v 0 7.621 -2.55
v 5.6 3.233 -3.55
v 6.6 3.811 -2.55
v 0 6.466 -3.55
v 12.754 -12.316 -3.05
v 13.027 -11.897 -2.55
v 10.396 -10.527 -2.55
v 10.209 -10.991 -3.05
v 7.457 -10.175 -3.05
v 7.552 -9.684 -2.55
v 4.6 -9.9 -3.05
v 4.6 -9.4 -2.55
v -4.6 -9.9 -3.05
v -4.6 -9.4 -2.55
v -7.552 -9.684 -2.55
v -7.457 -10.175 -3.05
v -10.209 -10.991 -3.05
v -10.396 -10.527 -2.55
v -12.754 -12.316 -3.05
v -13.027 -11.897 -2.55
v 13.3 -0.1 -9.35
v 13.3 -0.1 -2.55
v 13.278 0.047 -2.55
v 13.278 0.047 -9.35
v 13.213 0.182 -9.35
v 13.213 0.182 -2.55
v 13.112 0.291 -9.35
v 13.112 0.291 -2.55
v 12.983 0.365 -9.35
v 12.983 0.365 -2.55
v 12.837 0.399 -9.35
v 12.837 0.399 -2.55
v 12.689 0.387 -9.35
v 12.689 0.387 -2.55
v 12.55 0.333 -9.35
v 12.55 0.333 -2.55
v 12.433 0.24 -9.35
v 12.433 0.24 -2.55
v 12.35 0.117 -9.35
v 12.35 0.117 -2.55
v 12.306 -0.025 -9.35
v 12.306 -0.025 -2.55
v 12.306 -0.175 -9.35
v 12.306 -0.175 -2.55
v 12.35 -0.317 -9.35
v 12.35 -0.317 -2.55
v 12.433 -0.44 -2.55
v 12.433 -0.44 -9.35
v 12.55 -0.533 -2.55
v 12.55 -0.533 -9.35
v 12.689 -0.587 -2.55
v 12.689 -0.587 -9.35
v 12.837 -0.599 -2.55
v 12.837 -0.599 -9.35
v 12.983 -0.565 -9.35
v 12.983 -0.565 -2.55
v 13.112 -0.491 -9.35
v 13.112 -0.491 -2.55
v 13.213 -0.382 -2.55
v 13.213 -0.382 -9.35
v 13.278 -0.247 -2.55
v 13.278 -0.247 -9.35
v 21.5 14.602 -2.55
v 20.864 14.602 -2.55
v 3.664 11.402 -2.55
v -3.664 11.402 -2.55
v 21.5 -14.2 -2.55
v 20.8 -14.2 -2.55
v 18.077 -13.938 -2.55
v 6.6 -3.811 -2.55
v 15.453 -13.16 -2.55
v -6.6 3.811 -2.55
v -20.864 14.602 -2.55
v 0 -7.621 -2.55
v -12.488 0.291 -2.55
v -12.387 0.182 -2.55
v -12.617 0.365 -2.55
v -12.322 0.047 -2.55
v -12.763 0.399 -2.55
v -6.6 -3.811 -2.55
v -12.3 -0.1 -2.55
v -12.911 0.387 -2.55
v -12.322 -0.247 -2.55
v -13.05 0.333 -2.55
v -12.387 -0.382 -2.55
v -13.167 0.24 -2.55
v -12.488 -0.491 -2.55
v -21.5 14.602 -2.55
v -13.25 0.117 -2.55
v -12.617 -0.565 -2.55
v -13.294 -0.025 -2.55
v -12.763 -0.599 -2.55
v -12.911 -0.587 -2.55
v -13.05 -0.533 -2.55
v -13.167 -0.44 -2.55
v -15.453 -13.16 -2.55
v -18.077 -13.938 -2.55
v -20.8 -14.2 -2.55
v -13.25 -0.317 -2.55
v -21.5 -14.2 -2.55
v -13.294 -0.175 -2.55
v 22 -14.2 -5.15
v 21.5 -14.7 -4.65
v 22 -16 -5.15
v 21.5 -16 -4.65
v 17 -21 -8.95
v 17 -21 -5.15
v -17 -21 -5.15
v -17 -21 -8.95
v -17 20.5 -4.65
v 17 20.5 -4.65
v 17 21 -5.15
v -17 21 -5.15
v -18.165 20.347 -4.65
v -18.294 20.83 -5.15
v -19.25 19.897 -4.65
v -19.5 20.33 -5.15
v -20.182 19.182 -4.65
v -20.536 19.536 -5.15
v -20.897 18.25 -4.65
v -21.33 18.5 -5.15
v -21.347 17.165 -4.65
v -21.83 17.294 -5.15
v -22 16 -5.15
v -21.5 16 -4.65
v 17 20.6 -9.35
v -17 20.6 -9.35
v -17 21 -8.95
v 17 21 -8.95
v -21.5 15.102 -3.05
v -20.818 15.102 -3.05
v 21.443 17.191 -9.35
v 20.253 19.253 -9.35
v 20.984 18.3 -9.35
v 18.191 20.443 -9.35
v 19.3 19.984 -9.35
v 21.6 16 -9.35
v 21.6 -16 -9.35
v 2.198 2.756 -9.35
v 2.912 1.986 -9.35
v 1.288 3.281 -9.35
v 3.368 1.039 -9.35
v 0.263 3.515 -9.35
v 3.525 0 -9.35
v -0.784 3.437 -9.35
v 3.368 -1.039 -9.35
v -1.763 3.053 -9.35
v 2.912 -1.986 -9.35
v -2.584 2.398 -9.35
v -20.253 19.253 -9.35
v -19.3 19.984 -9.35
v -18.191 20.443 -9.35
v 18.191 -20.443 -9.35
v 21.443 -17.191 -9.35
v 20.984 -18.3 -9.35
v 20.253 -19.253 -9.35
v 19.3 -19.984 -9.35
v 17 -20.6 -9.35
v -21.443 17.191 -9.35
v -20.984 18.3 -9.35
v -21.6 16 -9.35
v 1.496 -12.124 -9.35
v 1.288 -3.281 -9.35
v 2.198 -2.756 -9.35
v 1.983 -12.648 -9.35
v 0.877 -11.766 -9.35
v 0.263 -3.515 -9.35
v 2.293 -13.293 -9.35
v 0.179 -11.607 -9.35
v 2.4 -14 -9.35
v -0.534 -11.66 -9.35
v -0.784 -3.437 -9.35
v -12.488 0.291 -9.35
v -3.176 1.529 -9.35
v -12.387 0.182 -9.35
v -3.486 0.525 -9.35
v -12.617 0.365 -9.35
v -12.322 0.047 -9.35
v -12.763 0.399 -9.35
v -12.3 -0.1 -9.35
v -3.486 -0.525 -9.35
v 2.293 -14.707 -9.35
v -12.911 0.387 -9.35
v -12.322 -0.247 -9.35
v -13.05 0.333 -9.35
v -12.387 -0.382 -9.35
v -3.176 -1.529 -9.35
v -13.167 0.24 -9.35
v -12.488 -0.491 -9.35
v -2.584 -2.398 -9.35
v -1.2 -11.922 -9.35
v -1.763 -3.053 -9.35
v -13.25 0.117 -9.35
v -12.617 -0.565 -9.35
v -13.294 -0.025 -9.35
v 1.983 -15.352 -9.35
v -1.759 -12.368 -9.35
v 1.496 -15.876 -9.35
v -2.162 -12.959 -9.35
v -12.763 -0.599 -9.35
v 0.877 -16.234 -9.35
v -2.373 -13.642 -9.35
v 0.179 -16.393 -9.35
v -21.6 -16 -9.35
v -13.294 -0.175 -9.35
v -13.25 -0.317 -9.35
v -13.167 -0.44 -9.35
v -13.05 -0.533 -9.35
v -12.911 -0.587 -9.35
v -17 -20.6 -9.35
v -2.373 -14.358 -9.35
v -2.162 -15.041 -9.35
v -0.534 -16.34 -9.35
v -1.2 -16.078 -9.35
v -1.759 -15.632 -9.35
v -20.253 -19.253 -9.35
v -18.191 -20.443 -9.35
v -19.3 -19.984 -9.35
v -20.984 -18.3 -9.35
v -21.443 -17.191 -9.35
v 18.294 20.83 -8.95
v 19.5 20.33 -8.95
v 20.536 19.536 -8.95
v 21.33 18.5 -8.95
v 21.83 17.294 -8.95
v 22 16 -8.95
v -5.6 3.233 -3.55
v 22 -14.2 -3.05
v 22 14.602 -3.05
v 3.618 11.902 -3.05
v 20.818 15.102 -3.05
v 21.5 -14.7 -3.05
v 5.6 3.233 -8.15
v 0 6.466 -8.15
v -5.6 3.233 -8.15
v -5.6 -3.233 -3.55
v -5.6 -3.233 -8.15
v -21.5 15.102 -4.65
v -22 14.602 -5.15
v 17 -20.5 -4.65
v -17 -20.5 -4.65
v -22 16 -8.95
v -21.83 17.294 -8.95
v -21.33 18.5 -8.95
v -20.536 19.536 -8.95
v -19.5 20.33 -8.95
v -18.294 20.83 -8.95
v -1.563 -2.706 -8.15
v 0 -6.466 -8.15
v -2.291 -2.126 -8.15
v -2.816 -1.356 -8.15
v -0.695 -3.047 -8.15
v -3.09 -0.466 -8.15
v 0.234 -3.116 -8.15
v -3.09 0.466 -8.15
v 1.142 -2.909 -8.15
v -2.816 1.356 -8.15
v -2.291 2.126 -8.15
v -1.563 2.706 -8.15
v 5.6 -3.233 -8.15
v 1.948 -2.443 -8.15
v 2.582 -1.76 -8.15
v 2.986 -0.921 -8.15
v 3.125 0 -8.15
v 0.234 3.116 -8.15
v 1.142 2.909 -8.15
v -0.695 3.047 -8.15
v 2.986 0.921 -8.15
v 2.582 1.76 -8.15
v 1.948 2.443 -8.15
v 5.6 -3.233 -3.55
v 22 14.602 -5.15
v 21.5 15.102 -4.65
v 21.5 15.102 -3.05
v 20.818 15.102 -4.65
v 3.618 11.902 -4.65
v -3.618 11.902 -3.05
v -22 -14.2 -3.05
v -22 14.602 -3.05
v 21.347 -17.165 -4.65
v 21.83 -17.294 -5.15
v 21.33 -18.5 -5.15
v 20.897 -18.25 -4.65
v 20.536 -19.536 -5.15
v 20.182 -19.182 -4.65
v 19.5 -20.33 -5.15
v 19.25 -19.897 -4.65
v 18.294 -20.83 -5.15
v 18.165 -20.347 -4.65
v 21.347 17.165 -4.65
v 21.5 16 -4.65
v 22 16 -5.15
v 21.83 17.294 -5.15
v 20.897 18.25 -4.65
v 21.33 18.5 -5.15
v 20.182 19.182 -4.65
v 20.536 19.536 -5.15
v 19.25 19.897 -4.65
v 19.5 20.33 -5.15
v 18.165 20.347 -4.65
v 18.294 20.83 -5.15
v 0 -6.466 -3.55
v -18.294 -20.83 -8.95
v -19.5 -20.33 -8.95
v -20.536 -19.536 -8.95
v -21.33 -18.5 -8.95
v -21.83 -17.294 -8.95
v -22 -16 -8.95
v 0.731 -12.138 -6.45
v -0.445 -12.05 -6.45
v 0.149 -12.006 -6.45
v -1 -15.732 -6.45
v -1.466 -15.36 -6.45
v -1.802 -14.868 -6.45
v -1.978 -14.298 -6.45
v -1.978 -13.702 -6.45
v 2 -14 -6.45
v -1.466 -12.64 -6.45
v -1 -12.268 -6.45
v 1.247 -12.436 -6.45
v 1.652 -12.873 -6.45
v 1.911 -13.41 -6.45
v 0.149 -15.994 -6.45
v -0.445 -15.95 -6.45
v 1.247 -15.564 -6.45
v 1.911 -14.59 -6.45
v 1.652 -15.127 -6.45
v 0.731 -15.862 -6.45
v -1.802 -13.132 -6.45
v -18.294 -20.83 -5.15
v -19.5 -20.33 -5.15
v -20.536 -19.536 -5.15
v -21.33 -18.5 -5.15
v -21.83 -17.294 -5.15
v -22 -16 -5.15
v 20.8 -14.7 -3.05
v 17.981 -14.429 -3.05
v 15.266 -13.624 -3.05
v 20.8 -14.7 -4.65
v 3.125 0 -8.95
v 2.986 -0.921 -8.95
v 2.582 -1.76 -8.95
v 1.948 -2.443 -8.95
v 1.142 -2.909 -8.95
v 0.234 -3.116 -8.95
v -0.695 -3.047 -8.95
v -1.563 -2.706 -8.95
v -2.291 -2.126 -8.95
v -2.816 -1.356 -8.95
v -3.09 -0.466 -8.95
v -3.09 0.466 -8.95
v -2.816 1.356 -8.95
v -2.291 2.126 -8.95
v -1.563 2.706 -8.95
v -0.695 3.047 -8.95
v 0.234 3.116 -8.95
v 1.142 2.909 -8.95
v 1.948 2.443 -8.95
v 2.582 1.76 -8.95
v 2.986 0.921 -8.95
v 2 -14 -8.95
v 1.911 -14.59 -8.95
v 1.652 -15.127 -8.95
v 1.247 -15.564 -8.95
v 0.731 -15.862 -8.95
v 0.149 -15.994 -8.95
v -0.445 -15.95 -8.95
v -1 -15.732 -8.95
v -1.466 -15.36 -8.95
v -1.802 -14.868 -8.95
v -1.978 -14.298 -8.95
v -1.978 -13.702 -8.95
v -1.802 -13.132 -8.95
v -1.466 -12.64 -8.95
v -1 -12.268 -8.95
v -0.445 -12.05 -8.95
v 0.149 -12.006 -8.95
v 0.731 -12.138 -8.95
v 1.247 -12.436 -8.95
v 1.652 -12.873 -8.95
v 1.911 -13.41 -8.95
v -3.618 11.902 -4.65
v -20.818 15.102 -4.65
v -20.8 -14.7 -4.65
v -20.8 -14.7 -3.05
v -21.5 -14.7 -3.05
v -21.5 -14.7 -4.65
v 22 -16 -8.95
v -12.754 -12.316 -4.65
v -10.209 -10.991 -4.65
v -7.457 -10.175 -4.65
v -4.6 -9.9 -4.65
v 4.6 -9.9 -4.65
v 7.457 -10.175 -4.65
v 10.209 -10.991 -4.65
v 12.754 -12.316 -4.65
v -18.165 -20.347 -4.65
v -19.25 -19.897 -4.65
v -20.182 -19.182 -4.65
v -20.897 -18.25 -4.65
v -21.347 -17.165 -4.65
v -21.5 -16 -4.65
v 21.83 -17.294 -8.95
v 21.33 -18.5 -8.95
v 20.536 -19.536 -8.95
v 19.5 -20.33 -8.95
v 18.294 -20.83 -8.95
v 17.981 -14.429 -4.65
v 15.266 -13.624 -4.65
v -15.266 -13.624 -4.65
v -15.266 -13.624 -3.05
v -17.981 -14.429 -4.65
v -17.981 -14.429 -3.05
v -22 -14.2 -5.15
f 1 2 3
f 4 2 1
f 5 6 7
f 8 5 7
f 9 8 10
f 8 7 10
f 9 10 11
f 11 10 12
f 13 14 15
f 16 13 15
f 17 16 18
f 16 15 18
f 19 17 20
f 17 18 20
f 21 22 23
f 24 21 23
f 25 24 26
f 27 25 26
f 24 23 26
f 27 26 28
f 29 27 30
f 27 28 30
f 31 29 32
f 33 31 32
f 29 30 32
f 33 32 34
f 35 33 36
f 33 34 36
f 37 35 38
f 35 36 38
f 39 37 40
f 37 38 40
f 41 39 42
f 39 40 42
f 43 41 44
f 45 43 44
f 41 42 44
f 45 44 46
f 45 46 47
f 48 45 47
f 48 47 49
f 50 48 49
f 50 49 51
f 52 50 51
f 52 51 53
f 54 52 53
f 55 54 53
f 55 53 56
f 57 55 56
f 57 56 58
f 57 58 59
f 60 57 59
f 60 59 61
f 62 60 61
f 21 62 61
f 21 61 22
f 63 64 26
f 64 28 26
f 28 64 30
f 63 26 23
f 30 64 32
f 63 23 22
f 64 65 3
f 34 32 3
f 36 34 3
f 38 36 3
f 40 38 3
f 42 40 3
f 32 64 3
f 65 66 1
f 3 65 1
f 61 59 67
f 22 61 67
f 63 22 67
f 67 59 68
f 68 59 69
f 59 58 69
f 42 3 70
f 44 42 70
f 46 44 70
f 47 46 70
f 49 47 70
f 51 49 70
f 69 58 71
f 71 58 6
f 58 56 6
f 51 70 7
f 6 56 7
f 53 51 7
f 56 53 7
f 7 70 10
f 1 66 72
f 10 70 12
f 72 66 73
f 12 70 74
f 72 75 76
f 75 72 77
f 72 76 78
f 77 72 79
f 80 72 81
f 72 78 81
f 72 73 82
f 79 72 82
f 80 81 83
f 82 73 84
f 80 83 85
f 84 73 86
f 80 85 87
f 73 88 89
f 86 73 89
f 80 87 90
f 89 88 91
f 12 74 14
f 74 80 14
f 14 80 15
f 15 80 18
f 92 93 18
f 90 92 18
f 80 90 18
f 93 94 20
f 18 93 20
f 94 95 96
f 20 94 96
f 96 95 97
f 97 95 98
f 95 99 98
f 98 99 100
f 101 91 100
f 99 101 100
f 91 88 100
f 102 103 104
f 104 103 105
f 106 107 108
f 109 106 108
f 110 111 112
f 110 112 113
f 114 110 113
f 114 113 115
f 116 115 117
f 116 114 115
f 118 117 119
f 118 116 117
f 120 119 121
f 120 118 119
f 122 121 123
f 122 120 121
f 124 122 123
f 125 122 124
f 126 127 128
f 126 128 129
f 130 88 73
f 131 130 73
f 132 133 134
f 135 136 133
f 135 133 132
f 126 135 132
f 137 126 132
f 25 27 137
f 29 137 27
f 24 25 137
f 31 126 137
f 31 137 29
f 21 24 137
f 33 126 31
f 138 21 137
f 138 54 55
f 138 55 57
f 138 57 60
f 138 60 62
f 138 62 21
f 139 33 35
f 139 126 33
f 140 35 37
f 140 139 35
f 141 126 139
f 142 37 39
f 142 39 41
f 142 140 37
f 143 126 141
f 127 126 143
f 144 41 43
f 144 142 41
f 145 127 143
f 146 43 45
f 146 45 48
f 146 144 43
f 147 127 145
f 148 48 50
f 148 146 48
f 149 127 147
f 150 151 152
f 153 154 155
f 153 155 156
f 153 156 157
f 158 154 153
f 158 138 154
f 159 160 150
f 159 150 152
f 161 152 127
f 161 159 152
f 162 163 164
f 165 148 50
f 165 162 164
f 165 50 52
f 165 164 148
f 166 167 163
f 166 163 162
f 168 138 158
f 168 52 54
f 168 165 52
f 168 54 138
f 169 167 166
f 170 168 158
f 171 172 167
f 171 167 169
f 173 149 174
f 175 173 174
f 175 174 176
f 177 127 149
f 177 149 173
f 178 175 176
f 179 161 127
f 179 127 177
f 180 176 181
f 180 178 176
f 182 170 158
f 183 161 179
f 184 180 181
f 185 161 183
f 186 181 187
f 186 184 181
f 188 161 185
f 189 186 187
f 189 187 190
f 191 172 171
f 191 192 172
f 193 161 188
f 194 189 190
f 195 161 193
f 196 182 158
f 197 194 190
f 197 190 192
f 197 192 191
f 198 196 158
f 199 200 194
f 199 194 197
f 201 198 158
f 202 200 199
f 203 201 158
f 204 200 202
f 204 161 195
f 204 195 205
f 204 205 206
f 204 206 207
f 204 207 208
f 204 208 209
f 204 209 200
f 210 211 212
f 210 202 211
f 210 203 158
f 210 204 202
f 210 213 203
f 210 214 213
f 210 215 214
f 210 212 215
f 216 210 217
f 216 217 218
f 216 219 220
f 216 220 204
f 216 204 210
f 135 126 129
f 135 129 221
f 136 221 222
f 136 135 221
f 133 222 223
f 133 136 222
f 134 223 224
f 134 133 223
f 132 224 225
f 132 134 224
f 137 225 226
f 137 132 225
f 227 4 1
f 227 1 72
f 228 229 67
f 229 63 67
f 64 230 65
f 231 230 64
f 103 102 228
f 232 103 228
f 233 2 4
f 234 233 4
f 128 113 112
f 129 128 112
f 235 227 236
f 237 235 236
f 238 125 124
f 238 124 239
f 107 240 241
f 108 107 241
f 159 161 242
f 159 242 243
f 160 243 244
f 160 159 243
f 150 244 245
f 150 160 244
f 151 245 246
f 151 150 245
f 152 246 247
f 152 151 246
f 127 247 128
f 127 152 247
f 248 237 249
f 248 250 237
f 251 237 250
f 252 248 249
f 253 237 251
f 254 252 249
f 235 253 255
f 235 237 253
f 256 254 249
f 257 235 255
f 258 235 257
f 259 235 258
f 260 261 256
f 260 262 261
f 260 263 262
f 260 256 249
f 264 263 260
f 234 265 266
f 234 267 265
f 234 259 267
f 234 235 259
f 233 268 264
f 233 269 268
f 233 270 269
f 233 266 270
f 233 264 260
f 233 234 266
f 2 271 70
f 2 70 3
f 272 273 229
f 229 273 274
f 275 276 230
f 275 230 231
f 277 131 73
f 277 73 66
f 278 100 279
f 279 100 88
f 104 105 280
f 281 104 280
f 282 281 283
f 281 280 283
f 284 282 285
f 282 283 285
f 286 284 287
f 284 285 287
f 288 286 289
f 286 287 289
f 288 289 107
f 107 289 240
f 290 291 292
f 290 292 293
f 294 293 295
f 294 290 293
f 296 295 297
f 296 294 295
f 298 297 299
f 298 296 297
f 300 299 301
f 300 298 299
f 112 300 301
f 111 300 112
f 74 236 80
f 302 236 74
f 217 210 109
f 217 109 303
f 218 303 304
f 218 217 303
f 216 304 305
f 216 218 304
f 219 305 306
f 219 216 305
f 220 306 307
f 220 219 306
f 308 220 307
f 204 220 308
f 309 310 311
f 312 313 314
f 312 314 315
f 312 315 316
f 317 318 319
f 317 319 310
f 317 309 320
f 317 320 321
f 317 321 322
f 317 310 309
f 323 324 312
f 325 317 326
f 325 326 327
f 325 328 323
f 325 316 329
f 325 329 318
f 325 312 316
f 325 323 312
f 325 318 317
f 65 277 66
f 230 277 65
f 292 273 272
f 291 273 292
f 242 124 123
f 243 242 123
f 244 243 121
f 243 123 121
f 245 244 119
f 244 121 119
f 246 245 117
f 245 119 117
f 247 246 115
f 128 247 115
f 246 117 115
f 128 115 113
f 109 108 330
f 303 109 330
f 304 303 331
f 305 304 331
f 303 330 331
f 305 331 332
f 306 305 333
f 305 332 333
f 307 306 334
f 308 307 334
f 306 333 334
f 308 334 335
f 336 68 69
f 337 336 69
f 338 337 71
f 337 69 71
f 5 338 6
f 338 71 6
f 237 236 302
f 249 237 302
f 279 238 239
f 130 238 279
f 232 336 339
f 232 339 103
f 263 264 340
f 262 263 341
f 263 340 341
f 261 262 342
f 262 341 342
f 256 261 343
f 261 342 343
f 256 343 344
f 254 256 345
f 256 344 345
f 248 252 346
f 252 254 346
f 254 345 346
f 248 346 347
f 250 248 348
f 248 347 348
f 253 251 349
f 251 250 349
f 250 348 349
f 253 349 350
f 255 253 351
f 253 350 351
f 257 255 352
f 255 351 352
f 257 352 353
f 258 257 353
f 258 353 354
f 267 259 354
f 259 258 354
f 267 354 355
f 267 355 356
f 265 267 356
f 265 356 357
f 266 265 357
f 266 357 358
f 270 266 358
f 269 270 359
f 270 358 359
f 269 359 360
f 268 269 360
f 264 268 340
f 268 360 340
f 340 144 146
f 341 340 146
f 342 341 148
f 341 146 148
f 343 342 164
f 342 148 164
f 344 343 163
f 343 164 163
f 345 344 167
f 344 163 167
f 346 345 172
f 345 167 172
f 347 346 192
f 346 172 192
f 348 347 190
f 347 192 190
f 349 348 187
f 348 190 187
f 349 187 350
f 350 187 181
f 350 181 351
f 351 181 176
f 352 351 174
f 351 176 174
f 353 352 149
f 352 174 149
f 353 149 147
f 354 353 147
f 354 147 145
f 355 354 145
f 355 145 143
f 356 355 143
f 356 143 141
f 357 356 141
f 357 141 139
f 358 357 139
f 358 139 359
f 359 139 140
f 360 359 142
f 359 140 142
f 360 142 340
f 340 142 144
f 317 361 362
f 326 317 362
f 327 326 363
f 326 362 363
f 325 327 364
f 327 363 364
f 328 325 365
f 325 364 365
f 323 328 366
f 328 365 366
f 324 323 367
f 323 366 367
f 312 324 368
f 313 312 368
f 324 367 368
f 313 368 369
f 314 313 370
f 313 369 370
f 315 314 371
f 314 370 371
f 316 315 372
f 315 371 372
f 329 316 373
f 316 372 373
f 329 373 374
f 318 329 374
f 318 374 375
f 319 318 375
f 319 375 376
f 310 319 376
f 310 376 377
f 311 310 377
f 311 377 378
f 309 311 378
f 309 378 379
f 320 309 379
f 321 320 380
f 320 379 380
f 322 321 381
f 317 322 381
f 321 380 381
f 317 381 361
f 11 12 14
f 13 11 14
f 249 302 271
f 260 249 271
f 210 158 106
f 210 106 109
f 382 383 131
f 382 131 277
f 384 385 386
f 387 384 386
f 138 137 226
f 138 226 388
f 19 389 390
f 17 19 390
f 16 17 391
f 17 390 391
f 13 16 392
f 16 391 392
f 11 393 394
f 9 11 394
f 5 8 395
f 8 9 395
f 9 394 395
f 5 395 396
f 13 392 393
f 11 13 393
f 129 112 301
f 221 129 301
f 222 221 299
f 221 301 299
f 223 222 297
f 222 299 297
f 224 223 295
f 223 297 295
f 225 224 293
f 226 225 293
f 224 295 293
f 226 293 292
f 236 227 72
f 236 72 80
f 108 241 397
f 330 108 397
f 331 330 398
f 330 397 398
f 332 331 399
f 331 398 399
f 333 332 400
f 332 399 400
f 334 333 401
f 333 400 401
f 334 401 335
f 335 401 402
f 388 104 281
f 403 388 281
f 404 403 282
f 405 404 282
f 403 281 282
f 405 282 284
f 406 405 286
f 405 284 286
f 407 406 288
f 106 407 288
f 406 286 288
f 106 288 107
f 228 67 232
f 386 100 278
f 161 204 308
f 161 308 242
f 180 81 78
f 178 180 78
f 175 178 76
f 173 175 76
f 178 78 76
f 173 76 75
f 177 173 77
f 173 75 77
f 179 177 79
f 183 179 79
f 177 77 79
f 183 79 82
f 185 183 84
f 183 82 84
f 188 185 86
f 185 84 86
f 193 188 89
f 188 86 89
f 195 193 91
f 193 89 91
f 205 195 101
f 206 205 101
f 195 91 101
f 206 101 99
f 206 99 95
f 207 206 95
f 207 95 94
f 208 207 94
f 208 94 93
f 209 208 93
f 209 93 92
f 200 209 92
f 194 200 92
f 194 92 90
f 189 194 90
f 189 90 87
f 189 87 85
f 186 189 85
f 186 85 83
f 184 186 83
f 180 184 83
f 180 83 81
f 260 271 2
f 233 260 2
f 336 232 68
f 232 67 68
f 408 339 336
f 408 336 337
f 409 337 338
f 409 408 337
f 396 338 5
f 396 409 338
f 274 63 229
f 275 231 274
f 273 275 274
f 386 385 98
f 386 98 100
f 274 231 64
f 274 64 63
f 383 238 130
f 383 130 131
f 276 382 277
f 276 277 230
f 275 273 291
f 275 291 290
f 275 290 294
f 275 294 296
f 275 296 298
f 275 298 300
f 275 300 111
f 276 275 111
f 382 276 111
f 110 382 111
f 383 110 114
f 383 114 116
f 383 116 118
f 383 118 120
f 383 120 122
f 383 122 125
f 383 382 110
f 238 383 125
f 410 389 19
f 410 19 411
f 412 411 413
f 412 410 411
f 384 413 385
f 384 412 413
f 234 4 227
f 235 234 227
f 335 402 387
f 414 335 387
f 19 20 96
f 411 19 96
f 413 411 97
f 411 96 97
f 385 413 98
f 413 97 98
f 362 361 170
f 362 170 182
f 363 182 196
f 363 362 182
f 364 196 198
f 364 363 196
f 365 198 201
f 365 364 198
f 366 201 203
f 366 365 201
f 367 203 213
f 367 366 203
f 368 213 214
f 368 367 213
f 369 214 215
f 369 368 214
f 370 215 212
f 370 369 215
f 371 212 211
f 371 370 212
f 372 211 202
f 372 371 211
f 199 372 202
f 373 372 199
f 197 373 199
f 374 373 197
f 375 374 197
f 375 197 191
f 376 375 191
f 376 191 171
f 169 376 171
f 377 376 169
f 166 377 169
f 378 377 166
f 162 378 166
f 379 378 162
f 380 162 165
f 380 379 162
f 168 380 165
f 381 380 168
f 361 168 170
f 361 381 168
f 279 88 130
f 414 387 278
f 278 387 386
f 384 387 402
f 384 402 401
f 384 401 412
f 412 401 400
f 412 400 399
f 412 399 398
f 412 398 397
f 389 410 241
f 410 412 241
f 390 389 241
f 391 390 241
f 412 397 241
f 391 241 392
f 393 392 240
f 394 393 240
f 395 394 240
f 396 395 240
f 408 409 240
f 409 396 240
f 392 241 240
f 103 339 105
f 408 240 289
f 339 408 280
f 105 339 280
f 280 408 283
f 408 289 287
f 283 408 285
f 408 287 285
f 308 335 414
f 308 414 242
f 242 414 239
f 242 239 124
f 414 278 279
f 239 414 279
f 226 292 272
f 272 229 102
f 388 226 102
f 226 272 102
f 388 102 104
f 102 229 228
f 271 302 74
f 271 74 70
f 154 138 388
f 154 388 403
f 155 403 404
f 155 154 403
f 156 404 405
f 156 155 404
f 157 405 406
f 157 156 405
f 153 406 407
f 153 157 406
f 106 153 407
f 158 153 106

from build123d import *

# Parameters (mm, degrees)
PAD006_DEPTH       = 6.8
POCKET007_DEPTH    = 2.101
POCKET009_DEPTH    = 2.101
CHAMFER003_SIZE    = 0.5
SKETCH023_R        = 3.125
SKETCH023_R_2      = 2
POCKET021_DEPTH    = 2.9
POCKET021_FACE36_R = 3.125
POCKET022_DEPTH    = 3.901
POCKET023_DEPTH    = 5.6
CHAMFER006_SIZE    = 0.4
SKETCH021_R        = 0.5
POCKET024_DEPTH    = 6.801
CHAMFER007_SIZE    = 1


with BuildPart() as part:
    # ShapeBinder001 → Pad006 (new body)
    with BuildSketch(Plane(origin=(0, 0, -2.55), x_dir=(0, -1, 0), z_dir=(0, 0, -1))):
        with BuildLine():
            Line((21, -17), (21, 17))
            ThreePointArc((21, 17), (19.535534, 20.535534), (16, 22))
            Line((16, 22), (-16, 22))
            ThreePointArc((-16, 22), (-19.535534, 20.535534), (-21, 17))
            Line((-21, 17), (-21, -17))
            ThreePointArc((-21, -17), (-19.535534, -20.535534), (-16, -22))
            Line((-16, -22), (16, -22))
            ThreePointArc((16, -22), (19.535534, -20.535534), (21, -17))
        make_face()
    extrude(amount=PAD006_DEPTH)

    # Sketch012 (on Face1 of ShapeBinder003) → Pocket007 (cut, through all)
    with BuildSketch(Plane(origin=(0, 0, -4.65), x_dir=(1, 0, 0), z_dir=(0, 0, -1))):
        with BuildLine():
            Line((-22, -16), (-22, -15.101687))
            Line((-22, -15.101687), (-20.818291, -15.101687))
            Line((-20.818291, -15.101687), (-3.618291, -11.901687))
            Line((-3.618291, -11.901687), (3.618291, -11.901687))
            Line((3.618291, -11.901687), (20.818291, -15.101687))
            Line((20.818291, -15.101687), (22, -15.101687))
            Line((22, -15.101687), (22, -16))
            ThreePointArc((17, -21), (20.535534, -19.535534), (22, -16))
            Line((17, -21), (-17, -21))
            ThreePointArc((-22, -16), (-20.535534, -19.535534), (-17, -21))
        make_face()
    extrude(amount=-POCKET007_DEPTH, mode=Mode.SUBTRACT)

    # Sketch014 (on Face1 of ShapeBinder004) → Pocket009 (cut, through all)
    with BuildSketch(Plane(origin=(0, 0, -4.65), x_dir=(1, 0, 0), z_dir=(0, 0, -1))):
        with BuildLine():
            Line((17, 21), (-17, 21))
            ThreePointArc((-17, 21), (-20.535534, 19.535534), (-22, 16))
            Line((-22, 14.7), (-22, 16))
            Line((-20.8, 14.7), (-22, 14.7))
            ThreePointArc((-12.754477, 12.316141), (-16.604371, 14.0915), (-20.8, 14.7))
            ThreePointArc((-12.754477, 12.316141), (-8.852447, 10.516741), (-4.6, 9.9))
            Line((-4.6, 9.9), (4.6, 9.9))
            ThreePointArc((4.6, 9.9), (8.852447, 10.516741), (12.754477, 12.316141))
            ThreePointArc((20.8, 14.7), (16.604371, 14.0915), (12.754477, 12.316141))
            Line((20.8, 14.7), (22, 14.7))
            Line((22, 14.7), (22, 16))
            ThreePointArc((22, 16), (20.535534, 19.535534), (17, 21))
        make_face()
    extrude(amount=-POCKET009_DEPTH, mode=Mode.SUBTRACT)

    # Chamfer003
    chamfer003_edges = [part.edges().sort_by_distance(p)[0] for p in [
        (-21.4, -14.7, -2.55),
        (-16.604371, -14.0915, -2.55),
        (-8.852447, -10.516741, -2.55),
        (0, -9.9, -2.55),
        (8.852447, -10.516741, -2.55),
        (16.604371, -14.0915, -2.55),
        (21.4, -14.7, -2.55),
        (22, 0.200843, -2.55),
        (21.409145, 15.101687, -2.55),
        (12.218291, 13.501687, -2.55),
        (0, 11.901687, -2.55),
        (-12.218291, 13.501687, -2.55),
        (-21.409145, 15.101687, -2.55),
        (-22, 0.200843, -2.55),
        (0, -21, -4.65),
        (0, 21, -4.65),
        (22, -14.7, -3.6),
        (-22, -14.7, -3.6),
        (22, 15.101687, -3.6),
        (-22, 15.101687, -3.6),
    ]]
    chamfer(chamfer003_edges, length=CHAMFER003_SIZE)

    # Sketch023 → Pocket021 (cut)
    with BuildSketch(Plane(origin=(0, 0, -9.35), x_dir=(1, 0, 0), z_dir=(0, 0, -1))):
        Circle(SKETCH023_R)
        with Locations((0, 14)):
            Circle(SKETCH023_R_2)
    extrude(amount=-POCKET021_DEPTH, mode=Mode.SUBTRACT)

    # Pocket021 Face36 → Pocket022 (cut, through all)
    with BuildSketch(Plane(origin=(0, 0, -6.45), x_dir=(0, -1, 0), z_dir=(0, 0, -1))):
        Circle(POCKET021_FACE36_R)
    extrude(amount=-POCKET022_DEPTH, mode=Mode.SUBTRACT)

    # Sketch024 (on Face40 of Pocket022) → Pocket023 (cut)
    with BuildSketch(Plane.XY.offset(-2.55)):
        Polygon((0, 6.466323), (-5.6, 3.233162), (-5.6, -3.233162), (0, -6.466323), (5.6, -3.233162), (5.6, 3.233162), align=None)
    extrude(amount=-POCKET023_DEPTH, mode=Mode.SUBTRACT)

    # Chamfer006
    chamfer006_edges = [part.edges().sort_by_distance(p)[0] for p in [
        (0, -21, -9.35),
        (-20.535534, -19.535534, -9.35),
        (20.535534, -19.535534, -9.35),
        (-22, 0, -9.35),
        (22, 0, -9.35),
        (-20.535534, 19.535534, -9.35),
        (20.535534, 19.535534, -9.35),
        (0, 21, -9.35),
        (-3.125, 0, -9.35),
        (-2, -14, -9.35),
    ]]
    chamfer(chamfer006_edges, length=CHAMFER006_SIZE)

    # Sketch021 (on Face38 of Chamfer003) → Pocket024 (cut, through all)
    with BuildSketch(Plane.XY.offset(-2.55)):
        with Locations((-12.8, -0.1)):
            Circle(SKETCH021_R)
        with Locations((12.8, -0.1)):
            Circle(SKETCH021_R)
    extrude(amount=-POCKET024_DEPTH, mode=Mode.SUBTRACT)

    # Chamfer007
    chamfer007_edges = [part.edges().sort_by_distance(p)[0] for p in [
        (5.6, 0, -2.55),
        (2.8, 4.849742, -2.55),
        (-2.8, 4.849742, -2.55),
        (-5.6, 0, -2.55),
        (-2.8, -4.849742, -2.55),
        (2.8, -4.849742, -2.55),
    ]]
    chamfer(chamfer007_edges, length=CHAMFER007_SIZE)


solid = part.part
